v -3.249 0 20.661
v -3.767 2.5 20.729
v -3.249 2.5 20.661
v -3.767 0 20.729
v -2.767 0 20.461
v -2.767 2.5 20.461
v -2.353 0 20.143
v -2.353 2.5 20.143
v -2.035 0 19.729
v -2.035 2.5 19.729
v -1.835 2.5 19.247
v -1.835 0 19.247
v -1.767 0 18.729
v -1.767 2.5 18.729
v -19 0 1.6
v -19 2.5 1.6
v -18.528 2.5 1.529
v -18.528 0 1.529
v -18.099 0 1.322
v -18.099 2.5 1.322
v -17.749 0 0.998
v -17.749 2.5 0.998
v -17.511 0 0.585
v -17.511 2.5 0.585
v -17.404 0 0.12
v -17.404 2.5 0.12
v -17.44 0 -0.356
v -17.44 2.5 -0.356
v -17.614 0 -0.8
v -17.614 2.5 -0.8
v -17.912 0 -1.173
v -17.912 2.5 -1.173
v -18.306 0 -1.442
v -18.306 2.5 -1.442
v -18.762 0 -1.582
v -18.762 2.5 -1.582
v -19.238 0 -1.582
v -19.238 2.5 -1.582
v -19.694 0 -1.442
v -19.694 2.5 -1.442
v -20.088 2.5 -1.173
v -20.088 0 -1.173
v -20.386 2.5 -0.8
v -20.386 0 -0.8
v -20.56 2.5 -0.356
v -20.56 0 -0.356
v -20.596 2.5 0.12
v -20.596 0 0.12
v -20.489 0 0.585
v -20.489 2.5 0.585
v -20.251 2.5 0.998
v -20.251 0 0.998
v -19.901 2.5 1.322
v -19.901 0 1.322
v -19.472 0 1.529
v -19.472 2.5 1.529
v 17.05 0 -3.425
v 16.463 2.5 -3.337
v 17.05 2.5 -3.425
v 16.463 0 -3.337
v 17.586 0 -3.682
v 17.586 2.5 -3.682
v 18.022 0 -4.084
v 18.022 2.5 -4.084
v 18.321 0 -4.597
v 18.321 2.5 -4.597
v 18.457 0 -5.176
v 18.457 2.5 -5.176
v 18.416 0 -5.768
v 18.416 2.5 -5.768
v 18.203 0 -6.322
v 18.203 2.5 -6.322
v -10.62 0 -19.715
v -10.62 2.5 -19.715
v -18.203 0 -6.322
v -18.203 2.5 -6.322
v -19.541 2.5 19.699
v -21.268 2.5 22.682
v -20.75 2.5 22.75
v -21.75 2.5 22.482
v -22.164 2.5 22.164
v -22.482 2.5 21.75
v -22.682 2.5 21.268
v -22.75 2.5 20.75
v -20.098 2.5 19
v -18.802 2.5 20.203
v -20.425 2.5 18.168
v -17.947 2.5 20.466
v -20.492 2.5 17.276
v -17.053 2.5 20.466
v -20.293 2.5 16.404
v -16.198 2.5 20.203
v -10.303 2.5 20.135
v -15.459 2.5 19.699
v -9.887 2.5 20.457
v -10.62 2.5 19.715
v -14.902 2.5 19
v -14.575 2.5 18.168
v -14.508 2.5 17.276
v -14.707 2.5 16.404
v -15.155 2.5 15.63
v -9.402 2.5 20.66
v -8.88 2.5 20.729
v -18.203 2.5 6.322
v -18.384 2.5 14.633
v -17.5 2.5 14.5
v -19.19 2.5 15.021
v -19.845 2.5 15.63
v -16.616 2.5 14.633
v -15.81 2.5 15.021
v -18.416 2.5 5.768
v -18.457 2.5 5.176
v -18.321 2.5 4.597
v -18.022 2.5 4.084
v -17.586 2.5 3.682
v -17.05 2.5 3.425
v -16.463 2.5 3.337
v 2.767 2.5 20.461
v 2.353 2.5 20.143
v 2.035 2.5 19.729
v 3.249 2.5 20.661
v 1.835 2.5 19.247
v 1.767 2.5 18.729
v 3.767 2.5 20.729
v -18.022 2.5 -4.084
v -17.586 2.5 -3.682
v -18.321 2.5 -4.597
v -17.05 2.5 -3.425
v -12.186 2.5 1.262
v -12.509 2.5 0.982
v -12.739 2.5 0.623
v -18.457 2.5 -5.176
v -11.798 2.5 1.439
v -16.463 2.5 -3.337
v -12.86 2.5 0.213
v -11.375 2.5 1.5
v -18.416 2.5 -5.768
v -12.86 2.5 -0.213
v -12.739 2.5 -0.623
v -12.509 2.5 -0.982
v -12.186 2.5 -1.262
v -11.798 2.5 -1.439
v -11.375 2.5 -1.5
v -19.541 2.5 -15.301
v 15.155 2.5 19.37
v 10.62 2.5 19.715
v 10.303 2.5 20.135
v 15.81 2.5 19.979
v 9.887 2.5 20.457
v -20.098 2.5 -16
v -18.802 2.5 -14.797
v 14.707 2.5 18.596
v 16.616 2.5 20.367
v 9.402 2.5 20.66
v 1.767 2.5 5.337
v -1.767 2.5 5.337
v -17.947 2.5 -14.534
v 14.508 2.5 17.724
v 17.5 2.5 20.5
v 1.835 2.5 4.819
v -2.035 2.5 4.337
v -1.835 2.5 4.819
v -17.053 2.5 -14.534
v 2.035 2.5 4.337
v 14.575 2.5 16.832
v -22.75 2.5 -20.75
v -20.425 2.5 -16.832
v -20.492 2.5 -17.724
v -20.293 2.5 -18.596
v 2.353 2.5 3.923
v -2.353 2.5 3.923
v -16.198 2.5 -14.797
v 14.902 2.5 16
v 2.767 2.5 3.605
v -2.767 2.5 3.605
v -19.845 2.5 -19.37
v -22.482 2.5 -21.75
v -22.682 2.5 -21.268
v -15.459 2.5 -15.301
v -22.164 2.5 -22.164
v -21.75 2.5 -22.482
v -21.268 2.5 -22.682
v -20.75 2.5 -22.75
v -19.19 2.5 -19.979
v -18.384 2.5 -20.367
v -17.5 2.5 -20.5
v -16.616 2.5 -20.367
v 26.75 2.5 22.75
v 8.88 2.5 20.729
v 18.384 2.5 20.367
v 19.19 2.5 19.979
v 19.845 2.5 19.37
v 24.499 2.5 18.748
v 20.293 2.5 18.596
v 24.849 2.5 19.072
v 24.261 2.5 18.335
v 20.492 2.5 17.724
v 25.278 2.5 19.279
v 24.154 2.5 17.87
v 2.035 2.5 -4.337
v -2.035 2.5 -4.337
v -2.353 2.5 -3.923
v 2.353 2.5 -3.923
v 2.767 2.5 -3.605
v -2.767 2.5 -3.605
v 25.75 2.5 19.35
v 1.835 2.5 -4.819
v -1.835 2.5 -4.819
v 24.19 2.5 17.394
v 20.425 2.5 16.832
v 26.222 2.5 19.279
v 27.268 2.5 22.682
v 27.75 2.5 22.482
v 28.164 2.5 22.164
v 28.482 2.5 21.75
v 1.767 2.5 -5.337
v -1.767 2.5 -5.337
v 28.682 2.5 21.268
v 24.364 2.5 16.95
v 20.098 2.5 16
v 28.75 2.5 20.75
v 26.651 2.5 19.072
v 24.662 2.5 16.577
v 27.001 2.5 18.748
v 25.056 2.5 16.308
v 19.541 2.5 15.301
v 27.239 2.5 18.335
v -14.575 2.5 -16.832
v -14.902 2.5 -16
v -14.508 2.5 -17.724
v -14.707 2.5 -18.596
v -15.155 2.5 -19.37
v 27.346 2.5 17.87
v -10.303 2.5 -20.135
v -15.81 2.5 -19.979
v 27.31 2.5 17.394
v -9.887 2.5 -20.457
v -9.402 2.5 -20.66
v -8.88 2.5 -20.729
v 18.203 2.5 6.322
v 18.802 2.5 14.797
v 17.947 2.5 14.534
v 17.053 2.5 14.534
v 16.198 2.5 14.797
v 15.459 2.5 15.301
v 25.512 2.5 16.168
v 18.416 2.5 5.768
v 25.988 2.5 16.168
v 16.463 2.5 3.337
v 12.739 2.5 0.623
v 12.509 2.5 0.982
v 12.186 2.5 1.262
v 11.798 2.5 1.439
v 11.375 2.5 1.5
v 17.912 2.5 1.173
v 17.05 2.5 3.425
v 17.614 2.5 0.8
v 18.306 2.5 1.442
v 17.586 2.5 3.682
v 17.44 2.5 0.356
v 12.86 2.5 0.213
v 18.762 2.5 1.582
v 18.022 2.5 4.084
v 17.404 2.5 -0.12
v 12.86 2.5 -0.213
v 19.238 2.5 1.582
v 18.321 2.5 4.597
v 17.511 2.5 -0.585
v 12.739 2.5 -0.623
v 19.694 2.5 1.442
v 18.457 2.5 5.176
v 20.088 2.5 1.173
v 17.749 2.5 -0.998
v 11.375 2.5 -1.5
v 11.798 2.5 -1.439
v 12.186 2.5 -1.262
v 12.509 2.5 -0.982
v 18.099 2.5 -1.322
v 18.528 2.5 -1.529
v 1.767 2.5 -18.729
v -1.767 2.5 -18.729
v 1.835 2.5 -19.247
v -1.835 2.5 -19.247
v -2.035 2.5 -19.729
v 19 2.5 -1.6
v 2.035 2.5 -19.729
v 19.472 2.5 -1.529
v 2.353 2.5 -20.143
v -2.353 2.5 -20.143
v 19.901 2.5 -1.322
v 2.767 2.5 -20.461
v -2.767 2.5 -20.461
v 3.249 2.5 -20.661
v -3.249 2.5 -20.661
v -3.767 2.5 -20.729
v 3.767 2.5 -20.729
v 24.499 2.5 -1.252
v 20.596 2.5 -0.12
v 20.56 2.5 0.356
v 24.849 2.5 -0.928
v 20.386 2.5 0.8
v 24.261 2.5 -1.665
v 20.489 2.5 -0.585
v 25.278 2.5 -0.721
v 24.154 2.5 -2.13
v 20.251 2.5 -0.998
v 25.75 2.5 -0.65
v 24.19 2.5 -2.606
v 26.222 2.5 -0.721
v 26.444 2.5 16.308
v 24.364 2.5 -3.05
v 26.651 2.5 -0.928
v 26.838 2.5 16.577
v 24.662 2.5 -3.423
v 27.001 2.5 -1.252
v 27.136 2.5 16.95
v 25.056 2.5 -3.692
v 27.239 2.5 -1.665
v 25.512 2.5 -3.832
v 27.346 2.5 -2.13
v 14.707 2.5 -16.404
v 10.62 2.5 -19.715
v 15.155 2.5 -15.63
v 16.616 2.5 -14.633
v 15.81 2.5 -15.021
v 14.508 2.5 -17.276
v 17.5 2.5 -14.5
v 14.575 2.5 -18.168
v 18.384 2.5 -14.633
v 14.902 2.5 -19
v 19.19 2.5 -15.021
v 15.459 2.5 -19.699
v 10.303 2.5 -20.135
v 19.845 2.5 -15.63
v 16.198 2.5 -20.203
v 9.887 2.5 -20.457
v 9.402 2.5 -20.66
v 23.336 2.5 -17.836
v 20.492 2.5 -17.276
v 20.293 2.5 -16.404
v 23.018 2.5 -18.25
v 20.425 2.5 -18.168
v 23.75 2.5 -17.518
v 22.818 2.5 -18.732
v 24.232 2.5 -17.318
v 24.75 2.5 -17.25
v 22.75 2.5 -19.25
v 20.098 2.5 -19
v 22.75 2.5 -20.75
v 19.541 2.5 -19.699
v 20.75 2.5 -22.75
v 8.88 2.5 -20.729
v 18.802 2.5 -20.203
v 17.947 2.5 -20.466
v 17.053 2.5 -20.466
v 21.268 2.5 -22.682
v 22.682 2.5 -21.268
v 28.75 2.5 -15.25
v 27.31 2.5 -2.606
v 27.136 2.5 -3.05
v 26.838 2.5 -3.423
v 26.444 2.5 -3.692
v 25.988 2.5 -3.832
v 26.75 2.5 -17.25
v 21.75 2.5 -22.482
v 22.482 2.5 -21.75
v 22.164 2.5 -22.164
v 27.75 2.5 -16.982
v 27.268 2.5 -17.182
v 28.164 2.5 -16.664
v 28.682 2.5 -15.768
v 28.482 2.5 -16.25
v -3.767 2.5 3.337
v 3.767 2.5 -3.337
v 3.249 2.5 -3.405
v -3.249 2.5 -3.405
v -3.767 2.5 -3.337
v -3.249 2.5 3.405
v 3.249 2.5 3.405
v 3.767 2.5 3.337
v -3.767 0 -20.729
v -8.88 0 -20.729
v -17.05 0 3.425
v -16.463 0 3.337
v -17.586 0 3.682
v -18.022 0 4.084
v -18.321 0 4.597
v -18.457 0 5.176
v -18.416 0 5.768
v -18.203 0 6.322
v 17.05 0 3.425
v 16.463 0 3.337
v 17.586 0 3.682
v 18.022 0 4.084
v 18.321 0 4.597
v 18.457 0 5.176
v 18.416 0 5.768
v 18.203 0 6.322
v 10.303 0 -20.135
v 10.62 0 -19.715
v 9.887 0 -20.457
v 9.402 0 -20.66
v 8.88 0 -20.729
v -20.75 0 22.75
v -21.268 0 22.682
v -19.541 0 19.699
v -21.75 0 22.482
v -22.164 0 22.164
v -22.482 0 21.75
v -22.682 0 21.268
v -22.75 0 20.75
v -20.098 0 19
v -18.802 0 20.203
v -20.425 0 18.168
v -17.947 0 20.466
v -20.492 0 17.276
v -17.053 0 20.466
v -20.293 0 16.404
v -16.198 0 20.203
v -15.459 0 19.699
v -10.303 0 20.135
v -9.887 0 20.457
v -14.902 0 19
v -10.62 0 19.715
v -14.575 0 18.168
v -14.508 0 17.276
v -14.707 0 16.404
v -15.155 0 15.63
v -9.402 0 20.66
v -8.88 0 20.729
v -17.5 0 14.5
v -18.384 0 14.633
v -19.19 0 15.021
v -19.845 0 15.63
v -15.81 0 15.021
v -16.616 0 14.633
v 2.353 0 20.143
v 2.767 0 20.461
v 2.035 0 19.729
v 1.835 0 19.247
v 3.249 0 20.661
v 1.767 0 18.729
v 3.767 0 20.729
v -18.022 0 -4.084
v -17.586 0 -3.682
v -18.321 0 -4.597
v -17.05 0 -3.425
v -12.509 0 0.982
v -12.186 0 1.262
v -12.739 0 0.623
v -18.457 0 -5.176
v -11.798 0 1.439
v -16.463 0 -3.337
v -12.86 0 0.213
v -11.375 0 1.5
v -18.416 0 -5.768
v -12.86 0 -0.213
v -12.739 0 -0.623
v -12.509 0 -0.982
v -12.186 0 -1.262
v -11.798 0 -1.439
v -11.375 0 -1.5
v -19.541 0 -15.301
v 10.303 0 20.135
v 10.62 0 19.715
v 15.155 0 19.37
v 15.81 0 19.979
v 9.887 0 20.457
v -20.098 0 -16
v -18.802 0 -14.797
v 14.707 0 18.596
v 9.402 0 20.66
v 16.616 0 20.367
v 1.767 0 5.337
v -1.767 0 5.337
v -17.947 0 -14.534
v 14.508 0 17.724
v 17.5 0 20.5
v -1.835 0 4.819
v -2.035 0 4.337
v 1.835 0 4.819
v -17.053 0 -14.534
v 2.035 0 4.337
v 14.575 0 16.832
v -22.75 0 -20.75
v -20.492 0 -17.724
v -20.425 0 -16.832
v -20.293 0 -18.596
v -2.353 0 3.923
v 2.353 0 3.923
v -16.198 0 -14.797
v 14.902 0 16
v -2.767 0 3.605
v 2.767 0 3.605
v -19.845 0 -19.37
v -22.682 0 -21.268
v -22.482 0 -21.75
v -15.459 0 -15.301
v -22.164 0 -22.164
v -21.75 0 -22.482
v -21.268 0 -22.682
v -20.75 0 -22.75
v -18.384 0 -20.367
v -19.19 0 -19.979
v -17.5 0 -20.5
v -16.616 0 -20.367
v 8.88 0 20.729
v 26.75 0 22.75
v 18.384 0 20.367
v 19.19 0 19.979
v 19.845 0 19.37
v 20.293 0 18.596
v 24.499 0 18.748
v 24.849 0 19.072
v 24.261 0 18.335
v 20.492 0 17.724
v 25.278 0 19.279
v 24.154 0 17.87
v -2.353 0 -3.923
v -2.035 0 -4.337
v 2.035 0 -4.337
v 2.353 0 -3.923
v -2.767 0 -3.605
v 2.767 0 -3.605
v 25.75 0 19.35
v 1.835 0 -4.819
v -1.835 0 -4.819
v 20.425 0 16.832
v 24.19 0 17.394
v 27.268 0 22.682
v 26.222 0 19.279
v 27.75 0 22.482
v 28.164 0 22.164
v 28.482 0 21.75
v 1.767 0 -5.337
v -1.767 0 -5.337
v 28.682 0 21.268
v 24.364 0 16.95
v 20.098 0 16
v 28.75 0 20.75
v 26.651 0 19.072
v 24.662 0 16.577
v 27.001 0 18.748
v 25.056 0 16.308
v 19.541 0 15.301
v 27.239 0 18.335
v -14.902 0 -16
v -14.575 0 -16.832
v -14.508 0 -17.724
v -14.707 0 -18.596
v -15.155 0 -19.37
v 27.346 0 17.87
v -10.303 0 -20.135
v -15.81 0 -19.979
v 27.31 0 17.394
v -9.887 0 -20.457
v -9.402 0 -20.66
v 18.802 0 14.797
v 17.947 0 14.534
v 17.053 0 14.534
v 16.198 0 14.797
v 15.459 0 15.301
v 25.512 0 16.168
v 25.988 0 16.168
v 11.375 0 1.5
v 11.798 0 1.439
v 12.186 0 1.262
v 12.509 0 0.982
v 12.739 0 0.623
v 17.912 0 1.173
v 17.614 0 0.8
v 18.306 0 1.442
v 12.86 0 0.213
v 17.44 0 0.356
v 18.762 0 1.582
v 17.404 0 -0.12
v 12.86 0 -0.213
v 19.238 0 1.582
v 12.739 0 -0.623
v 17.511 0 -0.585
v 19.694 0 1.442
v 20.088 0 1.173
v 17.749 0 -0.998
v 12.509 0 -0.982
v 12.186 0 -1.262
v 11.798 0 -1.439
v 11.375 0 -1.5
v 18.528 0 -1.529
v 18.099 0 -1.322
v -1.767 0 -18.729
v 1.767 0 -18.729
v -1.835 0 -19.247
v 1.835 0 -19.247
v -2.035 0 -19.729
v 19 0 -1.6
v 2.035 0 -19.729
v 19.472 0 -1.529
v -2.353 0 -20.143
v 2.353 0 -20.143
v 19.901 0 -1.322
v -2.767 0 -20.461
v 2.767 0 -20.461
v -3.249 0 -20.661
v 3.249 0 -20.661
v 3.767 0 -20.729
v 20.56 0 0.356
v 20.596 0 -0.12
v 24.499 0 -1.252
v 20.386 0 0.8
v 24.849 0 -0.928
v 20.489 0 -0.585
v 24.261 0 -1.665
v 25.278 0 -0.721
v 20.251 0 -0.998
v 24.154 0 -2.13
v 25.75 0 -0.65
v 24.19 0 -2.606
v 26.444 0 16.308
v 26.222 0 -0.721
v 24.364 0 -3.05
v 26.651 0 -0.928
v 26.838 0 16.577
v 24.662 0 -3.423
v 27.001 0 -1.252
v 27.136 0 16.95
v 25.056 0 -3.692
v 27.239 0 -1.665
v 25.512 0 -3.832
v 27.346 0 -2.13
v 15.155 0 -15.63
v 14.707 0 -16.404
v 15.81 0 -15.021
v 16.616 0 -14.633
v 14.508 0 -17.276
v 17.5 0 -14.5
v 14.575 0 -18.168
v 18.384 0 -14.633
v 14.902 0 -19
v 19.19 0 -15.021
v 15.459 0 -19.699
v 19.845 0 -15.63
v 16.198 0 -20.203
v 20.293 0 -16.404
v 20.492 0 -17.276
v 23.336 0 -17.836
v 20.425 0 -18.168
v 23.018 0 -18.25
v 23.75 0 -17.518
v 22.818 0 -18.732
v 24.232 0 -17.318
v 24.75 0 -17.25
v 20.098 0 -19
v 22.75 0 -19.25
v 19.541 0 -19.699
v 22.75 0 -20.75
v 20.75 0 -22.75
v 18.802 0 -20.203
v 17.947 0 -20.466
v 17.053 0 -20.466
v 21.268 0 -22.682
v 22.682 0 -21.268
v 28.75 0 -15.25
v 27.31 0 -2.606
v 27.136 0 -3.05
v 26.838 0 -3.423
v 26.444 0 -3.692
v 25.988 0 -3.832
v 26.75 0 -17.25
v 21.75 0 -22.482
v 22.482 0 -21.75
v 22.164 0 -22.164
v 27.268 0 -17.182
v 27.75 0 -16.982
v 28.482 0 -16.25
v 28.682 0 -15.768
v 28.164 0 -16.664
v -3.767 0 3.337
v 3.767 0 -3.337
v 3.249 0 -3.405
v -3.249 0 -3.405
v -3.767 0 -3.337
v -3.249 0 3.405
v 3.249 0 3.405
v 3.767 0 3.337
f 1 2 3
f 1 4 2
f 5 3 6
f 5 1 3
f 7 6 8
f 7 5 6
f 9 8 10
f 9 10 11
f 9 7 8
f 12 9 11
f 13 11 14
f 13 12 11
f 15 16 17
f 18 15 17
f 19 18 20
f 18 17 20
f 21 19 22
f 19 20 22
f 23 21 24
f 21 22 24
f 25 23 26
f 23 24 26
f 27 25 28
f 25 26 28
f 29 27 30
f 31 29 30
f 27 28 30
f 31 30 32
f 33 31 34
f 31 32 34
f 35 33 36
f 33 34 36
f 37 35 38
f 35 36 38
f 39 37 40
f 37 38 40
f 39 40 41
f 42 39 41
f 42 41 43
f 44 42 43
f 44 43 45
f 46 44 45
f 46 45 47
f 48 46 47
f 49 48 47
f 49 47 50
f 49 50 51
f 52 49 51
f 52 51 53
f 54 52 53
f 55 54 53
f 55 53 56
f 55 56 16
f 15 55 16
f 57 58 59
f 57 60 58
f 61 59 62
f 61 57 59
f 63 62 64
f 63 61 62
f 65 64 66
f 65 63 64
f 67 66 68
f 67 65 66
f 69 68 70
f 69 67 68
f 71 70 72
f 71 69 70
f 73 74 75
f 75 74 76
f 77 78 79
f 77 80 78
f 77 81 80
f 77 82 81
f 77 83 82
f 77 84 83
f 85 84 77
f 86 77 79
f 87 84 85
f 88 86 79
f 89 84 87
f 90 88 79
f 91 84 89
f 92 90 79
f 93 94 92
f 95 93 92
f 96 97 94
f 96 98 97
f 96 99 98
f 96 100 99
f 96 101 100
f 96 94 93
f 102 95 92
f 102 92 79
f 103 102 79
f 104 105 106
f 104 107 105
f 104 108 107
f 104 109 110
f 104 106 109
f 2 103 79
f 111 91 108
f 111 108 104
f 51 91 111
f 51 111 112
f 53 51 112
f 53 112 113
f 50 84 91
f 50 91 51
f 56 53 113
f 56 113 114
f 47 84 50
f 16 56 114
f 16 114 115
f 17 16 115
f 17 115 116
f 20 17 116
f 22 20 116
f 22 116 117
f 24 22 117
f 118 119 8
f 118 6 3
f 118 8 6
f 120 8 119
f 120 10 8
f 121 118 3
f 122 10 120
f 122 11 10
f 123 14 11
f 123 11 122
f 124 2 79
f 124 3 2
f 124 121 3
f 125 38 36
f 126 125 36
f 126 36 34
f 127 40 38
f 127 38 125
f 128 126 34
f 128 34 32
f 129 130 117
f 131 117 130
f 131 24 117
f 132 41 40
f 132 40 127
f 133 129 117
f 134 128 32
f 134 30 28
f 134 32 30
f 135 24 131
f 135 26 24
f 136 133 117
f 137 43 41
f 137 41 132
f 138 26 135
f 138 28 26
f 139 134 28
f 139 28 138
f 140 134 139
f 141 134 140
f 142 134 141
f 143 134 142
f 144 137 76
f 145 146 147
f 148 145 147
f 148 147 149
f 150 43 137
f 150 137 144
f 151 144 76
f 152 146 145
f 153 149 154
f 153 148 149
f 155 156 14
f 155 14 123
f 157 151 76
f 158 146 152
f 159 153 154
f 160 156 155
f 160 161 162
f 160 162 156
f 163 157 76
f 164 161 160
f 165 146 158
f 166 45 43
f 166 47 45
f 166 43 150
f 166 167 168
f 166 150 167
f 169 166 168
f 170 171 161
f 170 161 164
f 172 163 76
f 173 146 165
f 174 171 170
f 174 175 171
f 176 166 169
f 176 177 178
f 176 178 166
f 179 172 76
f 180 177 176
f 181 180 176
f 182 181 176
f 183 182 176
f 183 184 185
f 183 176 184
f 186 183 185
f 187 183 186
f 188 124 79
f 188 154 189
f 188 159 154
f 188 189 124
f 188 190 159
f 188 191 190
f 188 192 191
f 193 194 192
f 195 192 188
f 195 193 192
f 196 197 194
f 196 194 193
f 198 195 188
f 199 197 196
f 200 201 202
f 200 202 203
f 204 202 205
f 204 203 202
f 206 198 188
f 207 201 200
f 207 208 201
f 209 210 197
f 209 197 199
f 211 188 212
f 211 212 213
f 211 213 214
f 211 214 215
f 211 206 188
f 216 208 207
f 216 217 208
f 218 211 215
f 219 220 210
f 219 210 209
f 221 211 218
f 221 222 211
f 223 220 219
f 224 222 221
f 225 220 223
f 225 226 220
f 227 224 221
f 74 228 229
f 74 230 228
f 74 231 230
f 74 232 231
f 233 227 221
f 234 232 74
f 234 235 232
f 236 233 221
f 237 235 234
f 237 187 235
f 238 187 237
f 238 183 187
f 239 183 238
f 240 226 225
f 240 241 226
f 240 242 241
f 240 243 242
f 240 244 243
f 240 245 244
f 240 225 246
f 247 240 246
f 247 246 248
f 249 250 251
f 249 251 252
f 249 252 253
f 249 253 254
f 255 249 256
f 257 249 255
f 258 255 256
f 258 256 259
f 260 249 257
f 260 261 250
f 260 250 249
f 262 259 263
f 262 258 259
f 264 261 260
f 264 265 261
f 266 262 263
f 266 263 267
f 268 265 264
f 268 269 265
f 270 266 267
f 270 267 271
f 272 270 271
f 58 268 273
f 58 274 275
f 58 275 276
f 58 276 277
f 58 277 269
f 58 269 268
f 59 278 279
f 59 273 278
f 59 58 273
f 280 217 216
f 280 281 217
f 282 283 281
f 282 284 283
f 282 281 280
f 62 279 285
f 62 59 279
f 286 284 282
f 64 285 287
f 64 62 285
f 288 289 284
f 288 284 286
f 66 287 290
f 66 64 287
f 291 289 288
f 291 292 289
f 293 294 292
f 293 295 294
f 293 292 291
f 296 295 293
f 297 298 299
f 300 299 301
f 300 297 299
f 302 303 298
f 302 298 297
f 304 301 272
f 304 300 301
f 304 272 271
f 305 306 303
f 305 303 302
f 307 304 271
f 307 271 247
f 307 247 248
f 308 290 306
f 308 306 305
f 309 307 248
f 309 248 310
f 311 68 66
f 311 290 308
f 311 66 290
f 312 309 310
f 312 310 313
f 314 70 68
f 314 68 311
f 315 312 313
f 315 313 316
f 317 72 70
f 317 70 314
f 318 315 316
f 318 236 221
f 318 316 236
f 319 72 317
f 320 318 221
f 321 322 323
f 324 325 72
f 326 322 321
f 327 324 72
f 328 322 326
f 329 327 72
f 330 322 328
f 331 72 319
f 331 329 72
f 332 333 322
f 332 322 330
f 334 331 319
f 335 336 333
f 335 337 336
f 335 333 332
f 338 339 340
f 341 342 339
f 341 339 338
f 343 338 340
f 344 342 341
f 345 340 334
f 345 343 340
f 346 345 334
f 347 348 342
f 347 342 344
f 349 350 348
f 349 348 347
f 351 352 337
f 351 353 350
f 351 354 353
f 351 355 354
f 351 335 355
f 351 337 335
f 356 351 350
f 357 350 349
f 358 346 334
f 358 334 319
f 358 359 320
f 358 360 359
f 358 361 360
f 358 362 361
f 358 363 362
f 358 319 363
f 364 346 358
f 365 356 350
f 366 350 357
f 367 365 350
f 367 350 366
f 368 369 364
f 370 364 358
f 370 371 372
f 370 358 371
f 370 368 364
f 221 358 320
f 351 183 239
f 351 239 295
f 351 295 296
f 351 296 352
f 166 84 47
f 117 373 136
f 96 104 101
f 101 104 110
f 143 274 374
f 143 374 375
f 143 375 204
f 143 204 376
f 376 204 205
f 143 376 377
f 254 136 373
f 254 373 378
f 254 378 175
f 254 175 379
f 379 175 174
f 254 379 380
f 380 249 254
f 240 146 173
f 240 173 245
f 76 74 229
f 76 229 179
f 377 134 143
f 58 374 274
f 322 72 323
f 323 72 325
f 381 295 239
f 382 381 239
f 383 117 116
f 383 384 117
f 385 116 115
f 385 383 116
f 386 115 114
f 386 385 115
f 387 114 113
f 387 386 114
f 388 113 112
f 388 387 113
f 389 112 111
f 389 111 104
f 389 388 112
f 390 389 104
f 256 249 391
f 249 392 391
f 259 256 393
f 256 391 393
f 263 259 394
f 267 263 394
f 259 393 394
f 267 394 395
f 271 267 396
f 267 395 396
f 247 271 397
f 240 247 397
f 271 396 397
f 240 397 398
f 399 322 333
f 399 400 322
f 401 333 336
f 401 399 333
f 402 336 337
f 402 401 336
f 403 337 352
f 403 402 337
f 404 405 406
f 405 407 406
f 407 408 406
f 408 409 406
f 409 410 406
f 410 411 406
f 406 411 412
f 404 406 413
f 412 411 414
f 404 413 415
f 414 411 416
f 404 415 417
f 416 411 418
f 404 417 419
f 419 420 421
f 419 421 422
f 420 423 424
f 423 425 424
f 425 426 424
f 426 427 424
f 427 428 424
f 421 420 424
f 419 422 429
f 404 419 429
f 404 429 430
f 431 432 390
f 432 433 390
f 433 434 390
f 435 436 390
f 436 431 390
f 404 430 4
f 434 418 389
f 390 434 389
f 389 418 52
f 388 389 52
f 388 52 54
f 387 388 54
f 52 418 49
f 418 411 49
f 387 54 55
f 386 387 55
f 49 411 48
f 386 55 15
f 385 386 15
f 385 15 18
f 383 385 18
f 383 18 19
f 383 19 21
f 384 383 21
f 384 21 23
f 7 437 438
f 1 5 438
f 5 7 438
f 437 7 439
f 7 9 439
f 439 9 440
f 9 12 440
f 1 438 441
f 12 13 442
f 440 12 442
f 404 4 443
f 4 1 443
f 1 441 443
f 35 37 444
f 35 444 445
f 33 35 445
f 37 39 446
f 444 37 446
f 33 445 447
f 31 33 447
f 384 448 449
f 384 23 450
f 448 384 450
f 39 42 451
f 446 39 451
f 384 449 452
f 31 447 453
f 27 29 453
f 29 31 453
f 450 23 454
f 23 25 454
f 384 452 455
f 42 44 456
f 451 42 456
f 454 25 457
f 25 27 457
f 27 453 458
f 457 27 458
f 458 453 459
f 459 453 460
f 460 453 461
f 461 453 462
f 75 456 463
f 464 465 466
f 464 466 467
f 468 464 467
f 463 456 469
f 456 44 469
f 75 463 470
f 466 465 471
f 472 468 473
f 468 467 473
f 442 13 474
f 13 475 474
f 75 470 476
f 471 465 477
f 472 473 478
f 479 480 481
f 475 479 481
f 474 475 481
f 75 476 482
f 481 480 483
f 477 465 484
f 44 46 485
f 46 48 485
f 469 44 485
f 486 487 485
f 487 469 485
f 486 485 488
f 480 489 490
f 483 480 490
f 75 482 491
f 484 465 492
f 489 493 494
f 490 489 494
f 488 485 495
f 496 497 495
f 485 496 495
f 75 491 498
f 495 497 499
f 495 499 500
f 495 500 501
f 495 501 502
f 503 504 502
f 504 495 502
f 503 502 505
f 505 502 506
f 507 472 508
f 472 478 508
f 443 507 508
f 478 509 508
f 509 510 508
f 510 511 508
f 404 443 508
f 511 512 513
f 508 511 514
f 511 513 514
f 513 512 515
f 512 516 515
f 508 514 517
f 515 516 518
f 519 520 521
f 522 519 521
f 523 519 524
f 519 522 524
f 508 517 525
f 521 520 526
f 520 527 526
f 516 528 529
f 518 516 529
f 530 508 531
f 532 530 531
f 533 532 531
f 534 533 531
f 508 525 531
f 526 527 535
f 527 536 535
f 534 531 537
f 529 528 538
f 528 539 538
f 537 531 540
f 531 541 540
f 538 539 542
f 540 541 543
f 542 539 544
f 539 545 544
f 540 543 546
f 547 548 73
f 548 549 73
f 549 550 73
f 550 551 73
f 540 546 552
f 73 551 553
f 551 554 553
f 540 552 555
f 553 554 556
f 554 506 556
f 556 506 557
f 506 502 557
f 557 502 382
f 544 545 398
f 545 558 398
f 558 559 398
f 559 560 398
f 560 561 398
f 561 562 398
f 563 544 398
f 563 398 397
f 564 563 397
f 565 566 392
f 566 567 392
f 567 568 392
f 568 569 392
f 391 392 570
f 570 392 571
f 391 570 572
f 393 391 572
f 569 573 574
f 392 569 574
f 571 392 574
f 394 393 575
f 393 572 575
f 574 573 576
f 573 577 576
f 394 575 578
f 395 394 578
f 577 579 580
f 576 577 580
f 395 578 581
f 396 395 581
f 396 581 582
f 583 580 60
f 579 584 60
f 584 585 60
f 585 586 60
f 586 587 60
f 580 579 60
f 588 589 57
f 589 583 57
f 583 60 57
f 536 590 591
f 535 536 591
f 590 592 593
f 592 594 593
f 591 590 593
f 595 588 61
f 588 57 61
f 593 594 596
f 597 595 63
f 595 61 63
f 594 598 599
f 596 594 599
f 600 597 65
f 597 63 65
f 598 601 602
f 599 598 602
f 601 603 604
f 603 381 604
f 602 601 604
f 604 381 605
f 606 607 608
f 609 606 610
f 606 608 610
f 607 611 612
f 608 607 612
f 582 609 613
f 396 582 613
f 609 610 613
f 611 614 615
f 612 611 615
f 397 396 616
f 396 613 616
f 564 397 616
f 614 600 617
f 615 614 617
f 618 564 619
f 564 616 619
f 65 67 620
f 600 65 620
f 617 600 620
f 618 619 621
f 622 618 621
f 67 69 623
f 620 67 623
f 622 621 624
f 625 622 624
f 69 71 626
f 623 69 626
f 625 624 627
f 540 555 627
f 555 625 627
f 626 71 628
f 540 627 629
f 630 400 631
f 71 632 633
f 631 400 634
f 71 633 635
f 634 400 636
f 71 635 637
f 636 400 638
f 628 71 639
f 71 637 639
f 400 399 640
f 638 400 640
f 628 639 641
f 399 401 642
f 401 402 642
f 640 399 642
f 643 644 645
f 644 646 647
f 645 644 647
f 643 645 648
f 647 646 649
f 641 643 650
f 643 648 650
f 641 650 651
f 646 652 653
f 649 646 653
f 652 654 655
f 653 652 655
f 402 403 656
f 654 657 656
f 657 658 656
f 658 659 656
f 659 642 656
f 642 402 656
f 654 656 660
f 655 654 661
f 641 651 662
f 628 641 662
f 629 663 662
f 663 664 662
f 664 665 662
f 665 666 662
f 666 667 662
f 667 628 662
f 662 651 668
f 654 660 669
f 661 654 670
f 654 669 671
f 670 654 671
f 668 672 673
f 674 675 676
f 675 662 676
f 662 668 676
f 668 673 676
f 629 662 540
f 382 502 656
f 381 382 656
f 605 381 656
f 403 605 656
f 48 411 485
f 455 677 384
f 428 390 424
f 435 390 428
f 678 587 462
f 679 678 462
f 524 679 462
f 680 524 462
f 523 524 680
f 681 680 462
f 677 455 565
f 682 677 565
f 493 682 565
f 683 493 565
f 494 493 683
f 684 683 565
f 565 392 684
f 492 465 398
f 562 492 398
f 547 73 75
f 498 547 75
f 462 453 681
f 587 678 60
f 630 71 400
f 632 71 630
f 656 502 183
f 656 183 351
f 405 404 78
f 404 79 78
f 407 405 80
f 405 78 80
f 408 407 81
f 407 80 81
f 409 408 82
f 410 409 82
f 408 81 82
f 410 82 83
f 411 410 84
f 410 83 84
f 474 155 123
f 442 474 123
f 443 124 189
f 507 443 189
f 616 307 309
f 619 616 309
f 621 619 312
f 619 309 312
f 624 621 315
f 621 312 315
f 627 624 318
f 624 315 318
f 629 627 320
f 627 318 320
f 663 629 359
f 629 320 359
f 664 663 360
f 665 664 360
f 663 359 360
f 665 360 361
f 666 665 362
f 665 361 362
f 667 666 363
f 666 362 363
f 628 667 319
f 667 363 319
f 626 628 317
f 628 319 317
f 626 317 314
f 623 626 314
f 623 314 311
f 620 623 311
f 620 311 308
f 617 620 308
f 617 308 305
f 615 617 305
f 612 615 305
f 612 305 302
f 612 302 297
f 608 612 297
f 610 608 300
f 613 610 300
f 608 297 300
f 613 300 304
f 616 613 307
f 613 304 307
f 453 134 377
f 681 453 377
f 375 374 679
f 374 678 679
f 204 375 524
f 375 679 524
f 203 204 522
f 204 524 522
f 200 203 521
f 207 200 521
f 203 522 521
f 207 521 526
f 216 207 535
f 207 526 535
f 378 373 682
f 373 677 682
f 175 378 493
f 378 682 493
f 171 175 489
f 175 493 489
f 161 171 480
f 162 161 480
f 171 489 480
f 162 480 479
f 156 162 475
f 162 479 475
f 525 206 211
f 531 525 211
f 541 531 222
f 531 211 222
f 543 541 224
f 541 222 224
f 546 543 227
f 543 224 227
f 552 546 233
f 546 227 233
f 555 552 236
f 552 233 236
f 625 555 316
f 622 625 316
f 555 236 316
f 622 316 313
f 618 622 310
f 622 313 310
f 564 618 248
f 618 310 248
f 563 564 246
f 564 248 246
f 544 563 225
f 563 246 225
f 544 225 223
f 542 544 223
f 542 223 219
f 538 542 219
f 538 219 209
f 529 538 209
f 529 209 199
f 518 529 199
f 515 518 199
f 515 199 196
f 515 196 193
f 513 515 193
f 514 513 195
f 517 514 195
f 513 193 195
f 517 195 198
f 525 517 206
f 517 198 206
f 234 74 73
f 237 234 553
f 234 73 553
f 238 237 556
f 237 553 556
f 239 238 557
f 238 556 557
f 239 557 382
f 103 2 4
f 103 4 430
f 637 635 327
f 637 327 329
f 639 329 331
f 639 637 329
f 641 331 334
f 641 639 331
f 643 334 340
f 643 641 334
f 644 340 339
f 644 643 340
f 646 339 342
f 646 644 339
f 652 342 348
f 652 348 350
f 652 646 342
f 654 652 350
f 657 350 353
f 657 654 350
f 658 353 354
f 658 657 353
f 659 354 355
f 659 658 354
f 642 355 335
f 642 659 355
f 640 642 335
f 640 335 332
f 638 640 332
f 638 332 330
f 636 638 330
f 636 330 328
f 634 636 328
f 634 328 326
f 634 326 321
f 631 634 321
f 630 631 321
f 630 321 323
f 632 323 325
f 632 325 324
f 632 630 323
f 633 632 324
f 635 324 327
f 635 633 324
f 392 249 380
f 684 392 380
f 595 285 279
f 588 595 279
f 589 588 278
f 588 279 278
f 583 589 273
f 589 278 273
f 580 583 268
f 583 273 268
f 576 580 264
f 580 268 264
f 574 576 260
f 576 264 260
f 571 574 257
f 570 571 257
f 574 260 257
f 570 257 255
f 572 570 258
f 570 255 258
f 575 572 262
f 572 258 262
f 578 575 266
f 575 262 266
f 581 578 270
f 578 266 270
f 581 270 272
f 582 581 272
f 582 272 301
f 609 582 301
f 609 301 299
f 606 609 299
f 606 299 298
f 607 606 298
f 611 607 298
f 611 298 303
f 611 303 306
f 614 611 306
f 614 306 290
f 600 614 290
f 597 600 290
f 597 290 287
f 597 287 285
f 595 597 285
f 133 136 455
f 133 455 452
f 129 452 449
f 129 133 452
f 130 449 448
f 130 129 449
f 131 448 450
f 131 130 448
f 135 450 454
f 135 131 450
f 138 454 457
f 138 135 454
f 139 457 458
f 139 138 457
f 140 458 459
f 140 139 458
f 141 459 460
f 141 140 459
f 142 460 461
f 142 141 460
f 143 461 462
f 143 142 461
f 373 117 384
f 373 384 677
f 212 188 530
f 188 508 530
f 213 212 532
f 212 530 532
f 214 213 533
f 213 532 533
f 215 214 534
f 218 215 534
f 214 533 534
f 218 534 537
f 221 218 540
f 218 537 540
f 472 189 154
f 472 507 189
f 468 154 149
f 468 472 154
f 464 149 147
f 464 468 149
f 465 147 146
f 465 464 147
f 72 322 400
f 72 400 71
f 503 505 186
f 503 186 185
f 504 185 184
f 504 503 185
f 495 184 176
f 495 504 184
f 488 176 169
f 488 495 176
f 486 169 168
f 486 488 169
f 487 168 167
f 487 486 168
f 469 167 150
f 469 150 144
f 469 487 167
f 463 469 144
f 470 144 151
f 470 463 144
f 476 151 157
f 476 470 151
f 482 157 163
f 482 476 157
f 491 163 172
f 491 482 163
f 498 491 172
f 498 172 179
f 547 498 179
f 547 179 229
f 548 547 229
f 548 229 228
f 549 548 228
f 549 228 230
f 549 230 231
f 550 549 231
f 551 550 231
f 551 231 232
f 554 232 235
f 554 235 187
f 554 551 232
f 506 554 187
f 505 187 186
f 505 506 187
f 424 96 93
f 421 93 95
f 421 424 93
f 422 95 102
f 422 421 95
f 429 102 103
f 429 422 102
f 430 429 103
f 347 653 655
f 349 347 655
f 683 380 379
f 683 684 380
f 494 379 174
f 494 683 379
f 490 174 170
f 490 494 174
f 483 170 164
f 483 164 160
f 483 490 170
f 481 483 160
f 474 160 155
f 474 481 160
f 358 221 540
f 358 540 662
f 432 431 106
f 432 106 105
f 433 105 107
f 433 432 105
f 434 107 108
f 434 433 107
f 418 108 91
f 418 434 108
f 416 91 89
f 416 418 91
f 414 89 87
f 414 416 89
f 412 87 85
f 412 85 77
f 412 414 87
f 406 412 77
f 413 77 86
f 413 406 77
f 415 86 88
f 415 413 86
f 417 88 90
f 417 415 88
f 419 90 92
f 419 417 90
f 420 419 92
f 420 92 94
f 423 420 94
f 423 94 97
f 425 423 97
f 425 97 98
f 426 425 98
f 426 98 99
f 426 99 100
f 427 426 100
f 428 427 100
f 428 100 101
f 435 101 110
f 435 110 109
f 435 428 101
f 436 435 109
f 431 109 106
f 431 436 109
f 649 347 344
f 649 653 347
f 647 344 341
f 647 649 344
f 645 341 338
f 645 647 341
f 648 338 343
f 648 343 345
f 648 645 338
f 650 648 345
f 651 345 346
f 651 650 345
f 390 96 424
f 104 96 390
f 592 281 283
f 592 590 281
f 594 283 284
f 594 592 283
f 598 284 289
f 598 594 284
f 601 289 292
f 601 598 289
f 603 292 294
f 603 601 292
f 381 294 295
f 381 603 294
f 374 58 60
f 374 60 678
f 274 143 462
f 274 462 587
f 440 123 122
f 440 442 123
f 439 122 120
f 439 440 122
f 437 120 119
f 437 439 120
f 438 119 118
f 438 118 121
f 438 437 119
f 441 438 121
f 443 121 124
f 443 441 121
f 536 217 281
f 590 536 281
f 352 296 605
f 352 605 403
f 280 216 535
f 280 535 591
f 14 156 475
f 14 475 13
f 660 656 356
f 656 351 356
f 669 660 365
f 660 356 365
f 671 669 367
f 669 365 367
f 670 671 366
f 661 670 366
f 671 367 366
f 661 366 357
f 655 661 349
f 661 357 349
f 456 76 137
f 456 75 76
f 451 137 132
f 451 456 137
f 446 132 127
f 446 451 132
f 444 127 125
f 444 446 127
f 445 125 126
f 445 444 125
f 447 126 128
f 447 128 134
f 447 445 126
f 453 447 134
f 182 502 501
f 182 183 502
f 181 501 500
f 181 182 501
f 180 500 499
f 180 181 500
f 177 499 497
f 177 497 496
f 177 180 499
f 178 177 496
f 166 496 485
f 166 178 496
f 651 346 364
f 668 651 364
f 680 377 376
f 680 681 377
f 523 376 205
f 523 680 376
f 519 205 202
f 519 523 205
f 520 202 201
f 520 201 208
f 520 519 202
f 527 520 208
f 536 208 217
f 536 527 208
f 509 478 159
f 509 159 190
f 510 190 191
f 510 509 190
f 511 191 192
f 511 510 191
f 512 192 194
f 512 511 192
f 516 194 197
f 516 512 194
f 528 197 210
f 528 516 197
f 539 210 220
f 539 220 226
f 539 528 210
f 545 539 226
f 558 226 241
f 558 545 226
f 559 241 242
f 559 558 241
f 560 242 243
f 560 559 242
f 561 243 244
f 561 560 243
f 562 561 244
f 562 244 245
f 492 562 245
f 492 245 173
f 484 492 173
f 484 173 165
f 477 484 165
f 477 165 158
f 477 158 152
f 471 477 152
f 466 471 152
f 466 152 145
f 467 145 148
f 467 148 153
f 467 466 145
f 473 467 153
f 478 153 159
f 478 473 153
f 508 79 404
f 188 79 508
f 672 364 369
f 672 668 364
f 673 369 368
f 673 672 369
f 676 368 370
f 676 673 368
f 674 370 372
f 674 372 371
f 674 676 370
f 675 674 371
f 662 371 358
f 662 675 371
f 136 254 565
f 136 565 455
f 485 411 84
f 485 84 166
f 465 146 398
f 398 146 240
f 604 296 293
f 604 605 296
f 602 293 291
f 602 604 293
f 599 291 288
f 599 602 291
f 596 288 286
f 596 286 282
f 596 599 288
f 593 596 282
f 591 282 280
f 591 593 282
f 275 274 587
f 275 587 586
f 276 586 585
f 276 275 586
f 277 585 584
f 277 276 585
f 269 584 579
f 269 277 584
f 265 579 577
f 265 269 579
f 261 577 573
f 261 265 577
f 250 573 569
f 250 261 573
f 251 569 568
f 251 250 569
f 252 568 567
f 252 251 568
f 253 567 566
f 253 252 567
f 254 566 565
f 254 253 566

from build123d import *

# Parameters (mm, degrees)
SKETCH_1_W          = 45.5
SKETCH_1_H          = 45.5
SKETCH_1_R          = 3
EXTRUDE_1_DEPTH     = 2.5
SKETCH_2_W          = 6
SKETCH_2_H          = 40
SKETCH_2_R          = 1.6
EXTRUDE_2_DEPTH     = 2.5
FILLET_1_R          = 2
CUT_EXTRUDE_1_DEPTH = 37.747448891
FILLET_2_R          = 2
SKETCH_4_R          = 1.6
CUT_EXTRUDE_2_DEPTH = 37.747448891


with BuildPart() as part:
    # 草图1 → 凸台-拉伸1 (new body)
    with BuildSketch(Plane(origin=(0, 0, 0), x_dir=(1, 0, 0), z_dir=(0, 1, 0))):
        Rectangle(SKETCH_1_W, SKETCH_1_H)
        with Locations(Location((17.5, 17.5, 0), (0, 0, 270))):
            Circle(SKETCH_1_R, mode=Mode.SUBTRACT)
        with Locations(Location((17.5, -17.5, 0), (0, 0, 270))):
            Circle(SKETCH_1_R, mode=Mode.SUBTRACT)
        with Locations(Location((-17.5, -17.5, 0), (0, 0, 90))):
            Circle(SKETCH_1_R, mode=Mode.SUBTRACT)
        with Locations(Location((-17.5, 17.5, 0), (0, 0, 90))):
            Circle(SKETCH_1_R, mode=Mode.SUBTRACT)
    extrude(amount=EXTRUDE_1_DEPTH)

    # 草图2 → 凸台-拉伸2 (add)
    with BuildSketch(Plane(origin=(0, 2.5, 0), x_dir=(1, 0, 0), z_dir=(0, 1, 0))):
        with Locations((25.75, -2.75)):
            Rectangle(SKETCH_2_W, SKETCH_2_H)
        with Locations(Location((25.75, -17.75, 0), (0, 0, 270))):
            Circle(SKETCH_2_R, mode=Mode.SUBTRACT)
        with Locations(Location((25.75, 2.25, 0), (0, 0, 270))):
            Circle(SKETCH_2_R, mode=Mode.SUBTRACT)
    extrude(amount=-EXTRUDE_2_DEPTH)

    # 圆角1
    fillet_1_edges = [part.edges().sort_by_distance(p)[0] for p in [
        (28.75, 1.25, -17.25),
        (22.75, 1.25, -17.25),
        (28.75, 1.25, 22.75),
        (-22.75, 1.25, 22.75),
        (-22.75, 1.25, -22.75),
        (22.75, 1.25, -22.75),
    ]]
    fillet(fillet_1_edges, radius=FILLET_1_R)

    # 草图3 → 切除-拉伸1 (cut, through all)
    with BuildSketch(Plane(origin=(0, 2.5, 0), x_dir=(1, 0, 0), z_dir=(0, 1, 0))):
        Polygon((-10.045962714, 20.729282101), (-19.893887011, 3.33704153), (-1.766794069, 3.33704153), (-1.766794069, 20.729282101), align=None)
        Polygon((1.766794069, 3.33704153), (1.766794069, 20.729282101), (10.045962714, 20.729282101), (19.893887011, 3.33704153), align=None)
        Polygon((19.893887011, -3.33704153), (1.766794069, -3.33704153), (1.766794069, -20.729282101), (10.045962714, -20.729282101), align=None)
        Polygon((-1.766794069, -3.33704153), (-1.766794069, -20.729282101), (-10.045962714, -20.729282101), (-19.893887011, -3.33704153), align=None)
        with BuildLine():
            Line((-11.375, 1.5), (11.375, 1.5))
            ThreePointArc((11.375, 1.5), (12.875, 0), (11.375, -1.5))
            Line((11.375, -1.5), (-11.375, -1.5))
            ThreePointArc((-11.375, -1.5), (-12.875, 0), (-11.375, 1.5))
        make_face()
    extrude(amount=-CUT_EXTRUDE_1_DEPTH, mode=Mode.SUBTRACT)

    # 圆角2
    fillet_2_edges = [part.edges().sort_by_distance(p)[0] for p in [
        (19.893887011, 1.25, -3.33704153),
        (1.766794069, 1.25, -3.33704153),
        (1.766794069, 1.25, -20.729282101),
        (10.045962714, 1.25, -20.729282101),
        (19.893887011, 1.25, 3.33704153),
        (10.045962714, 1.25, 20.729282101),
        (1.766794069, 1.25, 20.729282101),
        (1.766794069, 1.25, 3.33704153),
        (-19.893887011, 1.25, 3.33704153),
        (-1.766794069, 1.25, 3.33704153),
        (-1.766794069, 1.25, 20.729282101),
        (-10.045962714, 1.25, 20.729282101),
        (-10.045962714, 1.25, -20.729282101),
        (-1.766794069, 1.25, -20.729282101),
        (-1.766794069, 1.25, -3.33704153),
        (-19.893887011, 1.25, -3.33704153),
    ]]
    fillet(fillet_2_edges, radius=FILLET_2_R)

    # 草图4 → 切除-拉伸2 (cut, through all)
    with BuildSketch(Plane(origin=(0, 2.5, 0), x_dir=(1, 0, 0), z_dir=(0, 1, 0))):
        with Locations(Location((-19, 0, 0), (0, 0, 270))):
            Circle(SKETCH_4_R)
        with Locations(Location((19, 0, 0), (0, 0, 90))):
            Circle(SKETCH_4_R)
    extrude(amount=-CUT_EXTRUDE_2_DEPTH, mode=Mode.SUBTRACT)


solid = part.part
